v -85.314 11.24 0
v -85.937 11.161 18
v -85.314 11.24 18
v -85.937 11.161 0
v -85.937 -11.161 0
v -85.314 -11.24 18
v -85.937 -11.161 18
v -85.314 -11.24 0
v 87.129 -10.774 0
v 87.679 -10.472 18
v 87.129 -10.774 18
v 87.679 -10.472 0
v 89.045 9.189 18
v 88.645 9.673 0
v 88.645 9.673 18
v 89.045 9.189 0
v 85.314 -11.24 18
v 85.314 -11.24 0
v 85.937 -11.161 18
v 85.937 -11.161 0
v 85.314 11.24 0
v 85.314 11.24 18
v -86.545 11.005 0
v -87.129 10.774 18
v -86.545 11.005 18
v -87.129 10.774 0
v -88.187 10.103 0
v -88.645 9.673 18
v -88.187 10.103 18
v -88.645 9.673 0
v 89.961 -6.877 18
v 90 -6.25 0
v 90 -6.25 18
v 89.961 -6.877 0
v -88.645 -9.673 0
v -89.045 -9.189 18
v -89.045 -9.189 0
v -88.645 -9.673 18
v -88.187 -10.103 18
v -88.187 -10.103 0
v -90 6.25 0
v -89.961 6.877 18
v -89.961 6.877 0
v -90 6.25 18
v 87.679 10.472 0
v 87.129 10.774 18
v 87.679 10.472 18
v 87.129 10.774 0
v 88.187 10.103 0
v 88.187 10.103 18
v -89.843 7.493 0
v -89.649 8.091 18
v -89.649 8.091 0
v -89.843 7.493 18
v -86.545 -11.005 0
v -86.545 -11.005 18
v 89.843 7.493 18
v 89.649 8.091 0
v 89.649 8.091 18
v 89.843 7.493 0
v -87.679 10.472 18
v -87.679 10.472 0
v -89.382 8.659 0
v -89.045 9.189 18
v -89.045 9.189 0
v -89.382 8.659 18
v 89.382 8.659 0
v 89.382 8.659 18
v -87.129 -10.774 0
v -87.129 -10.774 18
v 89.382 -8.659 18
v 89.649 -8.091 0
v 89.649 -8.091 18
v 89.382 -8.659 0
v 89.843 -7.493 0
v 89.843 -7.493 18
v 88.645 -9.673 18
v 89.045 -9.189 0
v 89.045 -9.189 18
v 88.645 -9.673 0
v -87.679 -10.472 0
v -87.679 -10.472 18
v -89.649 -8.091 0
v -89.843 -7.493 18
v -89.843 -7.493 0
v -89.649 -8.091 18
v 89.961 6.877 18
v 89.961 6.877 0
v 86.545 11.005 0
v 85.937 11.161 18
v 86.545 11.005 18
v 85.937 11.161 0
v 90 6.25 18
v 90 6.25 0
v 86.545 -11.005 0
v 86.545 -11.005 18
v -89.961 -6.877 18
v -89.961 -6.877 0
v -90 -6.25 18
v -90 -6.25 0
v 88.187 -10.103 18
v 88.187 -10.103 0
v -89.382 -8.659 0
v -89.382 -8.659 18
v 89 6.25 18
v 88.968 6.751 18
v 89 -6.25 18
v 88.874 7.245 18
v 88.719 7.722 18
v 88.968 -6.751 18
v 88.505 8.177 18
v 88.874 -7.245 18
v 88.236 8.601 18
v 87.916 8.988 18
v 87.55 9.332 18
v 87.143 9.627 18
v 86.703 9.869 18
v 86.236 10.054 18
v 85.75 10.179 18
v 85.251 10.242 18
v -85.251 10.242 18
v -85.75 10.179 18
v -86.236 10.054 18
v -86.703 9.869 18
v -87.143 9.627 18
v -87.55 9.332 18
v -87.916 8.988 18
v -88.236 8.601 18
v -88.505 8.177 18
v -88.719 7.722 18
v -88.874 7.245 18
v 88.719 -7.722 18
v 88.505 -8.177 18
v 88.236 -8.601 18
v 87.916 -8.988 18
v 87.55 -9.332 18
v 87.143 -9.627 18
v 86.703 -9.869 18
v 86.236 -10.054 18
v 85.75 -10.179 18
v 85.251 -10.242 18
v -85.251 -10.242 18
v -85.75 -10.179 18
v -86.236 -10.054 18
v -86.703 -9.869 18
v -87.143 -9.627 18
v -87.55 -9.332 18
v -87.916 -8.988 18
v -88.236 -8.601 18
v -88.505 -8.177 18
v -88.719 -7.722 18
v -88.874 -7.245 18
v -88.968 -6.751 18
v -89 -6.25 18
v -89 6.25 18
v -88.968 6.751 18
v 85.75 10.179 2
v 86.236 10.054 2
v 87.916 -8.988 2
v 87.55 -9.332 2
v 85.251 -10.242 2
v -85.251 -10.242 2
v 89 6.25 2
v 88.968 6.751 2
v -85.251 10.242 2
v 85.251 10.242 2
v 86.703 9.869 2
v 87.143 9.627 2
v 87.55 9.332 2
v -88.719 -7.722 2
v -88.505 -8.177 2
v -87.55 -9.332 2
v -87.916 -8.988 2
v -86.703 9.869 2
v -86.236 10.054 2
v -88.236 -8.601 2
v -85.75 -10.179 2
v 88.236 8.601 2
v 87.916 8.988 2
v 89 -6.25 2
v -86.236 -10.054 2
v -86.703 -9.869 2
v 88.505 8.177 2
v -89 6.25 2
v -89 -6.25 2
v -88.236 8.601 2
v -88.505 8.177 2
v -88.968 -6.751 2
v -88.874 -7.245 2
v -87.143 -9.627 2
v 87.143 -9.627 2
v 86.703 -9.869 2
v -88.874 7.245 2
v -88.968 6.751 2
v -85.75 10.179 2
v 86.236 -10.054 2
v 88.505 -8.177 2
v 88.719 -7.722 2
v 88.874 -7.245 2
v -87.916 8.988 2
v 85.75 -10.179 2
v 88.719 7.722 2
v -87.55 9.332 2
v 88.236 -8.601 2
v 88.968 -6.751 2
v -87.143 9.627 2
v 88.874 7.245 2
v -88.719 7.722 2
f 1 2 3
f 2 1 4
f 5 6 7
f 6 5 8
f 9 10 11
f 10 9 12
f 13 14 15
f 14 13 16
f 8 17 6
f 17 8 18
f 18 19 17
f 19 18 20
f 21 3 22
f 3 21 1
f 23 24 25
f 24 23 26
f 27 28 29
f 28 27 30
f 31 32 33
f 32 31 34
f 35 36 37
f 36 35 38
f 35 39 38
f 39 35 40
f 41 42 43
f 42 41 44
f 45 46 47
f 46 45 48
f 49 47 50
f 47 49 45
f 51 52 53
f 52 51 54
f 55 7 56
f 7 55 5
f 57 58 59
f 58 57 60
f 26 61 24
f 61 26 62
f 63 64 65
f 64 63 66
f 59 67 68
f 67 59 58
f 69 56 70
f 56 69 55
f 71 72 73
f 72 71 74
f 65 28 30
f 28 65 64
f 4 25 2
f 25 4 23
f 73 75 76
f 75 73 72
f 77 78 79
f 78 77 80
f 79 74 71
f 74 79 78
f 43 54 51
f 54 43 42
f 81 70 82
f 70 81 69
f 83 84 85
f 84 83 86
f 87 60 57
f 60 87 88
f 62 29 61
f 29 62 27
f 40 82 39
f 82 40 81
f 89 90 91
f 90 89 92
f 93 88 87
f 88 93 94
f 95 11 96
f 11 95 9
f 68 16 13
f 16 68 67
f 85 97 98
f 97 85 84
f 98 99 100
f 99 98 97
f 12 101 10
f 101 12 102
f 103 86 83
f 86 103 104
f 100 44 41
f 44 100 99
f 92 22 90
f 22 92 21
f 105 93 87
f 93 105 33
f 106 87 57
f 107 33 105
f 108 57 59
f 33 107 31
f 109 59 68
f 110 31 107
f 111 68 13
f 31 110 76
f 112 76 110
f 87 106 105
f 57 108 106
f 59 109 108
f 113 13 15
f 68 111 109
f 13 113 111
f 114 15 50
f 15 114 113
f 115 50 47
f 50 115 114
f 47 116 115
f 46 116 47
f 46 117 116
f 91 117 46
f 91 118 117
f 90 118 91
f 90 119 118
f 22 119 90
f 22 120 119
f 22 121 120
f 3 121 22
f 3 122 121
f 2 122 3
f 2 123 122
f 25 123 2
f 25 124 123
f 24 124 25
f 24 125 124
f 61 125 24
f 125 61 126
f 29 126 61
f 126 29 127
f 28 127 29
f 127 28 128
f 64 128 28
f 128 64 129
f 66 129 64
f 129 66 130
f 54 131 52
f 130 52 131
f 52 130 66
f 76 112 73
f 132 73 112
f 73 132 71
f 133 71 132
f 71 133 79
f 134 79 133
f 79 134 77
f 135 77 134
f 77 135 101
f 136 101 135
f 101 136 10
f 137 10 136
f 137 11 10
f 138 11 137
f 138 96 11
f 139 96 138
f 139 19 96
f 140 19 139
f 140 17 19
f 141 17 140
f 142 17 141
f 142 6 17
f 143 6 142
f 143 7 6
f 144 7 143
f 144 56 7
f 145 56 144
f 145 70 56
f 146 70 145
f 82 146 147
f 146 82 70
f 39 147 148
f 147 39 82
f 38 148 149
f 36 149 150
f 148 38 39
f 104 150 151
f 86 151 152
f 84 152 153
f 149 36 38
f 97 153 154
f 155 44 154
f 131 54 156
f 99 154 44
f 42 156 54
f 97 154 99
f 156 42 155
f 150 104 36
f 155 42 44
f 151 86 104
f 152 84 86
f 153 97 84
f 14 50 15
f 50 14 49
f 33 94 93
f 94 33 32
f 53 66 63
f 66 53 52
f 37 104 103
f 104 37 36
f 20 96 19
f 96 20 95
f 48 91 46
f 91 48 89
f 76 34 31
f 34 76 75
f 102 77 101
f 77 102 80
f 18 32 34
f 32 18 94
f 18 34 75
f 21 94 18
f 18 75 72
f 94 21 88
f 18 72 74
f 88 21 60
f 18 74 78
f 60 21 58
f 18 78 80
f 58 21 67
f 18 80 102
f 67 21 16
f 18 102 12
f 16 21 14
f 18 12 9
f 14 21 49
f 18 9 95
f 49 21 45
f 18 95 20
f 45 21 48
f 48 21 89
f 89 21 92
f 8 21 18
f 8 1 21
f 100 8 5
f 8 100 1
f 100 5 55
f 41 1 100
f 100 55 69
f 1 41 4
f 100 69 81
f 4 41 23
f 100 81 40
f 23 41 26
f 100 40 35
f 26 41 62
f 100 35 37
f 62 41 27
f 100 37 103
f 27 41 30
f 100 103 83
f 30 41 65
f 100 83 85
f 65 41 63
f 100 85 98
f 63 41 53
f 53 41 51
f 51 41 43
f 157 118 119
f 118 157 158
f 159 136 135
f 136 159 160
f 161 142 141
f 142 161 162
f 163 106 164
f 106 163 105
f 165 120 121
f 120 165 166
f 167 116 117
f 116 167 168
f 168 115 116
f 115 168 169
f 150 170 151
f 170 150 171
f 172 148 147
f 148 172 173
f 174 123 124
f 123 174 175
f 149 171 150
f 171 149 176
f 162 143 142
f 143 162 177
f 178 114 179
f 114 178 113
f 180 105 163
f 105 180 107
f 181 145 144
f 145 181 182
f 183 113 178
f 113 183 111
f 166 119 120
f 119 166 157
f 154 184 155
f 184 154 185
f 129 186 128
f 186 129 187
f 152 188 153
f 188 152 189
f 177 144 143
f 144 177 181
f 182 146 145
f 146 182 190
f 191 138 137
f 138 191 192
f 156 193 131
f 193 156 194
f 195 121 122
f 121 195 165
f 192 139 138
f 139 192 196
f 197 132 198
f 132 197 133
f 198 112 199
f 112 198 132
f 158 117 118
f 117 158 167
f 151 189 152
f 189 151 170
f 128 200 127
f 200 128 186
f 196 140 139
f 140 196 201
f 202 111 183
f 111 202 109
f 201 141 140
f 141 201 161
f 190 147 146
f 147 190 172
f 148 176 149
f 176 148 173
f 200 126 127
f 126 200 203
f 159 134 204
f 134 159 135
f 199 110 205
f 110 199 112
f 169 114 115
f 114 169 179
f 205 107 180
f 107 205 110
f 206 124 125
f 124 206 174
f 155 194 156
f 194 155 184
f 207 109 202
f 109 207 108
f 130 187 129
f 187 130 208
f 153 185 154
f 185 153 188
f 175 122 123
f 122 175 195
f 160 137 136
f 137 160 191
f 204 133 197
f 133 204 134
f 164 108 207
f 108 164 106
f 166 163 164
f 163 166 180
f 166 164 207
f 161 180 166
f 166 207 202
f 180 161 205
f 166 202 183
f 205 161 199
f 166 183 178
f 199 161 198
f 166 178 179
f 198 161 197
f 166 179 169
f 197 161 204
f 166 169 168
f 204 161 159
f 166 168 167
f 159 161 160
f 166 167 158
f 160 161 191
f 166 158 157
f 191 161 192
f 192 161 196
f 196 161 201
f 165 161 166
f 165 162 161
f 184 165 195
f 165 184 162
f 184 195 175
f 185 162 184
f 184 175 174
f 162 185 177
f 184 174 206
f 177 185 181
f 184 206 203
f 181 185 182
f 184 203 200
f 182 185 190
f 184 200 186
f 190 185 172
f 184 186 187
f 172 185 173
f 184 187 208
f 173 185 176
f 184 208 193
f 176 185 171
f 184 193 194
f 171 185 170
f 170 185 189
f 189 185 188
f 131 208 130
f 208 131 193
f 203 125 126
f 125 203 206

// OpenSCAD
$fn = 50;


difference() {
	union() {
		hull() {
			translate(v = [-85.0000000000, 6.2500000000, 0]) {
				cylinder(h = 18, r = 5);
			}
			translate(v = [85.0000000000, 6.2500000000, 0]) {
				cylinder(h = 18, r = 5);
			}
			translate(v = [-85.0000000000, -6.2500000000, 0]) {
				cylinder(h = 18, r = 5);
			}
			translate(v = [85.0000000000, -6.2500000000, 0]) {
				cylinder(h = 18, r = 5);
			}
		}
	}
	union() {
		translate(v = [0, 0, 2]) {
			hull() {
				translate(v = [-85.0000000000, 6.2500000000, 0]) {
					cylinder(h = 16, r = 4);
				}
				translate(v = [85.0000000000, 6.2500000000, 0]) {
					cylinder(h = 16, r = 4);
				}
				translate(v = [-85.0000000000, -6.2500000000, 0]) {
					cylinder(h = 16, r = 4);
				}
				translate(v = [85.0000000000, -6.2500000000, 0]) {
					cylinder(h = 16, r = 4);
				}
			}
		}
	}
}
